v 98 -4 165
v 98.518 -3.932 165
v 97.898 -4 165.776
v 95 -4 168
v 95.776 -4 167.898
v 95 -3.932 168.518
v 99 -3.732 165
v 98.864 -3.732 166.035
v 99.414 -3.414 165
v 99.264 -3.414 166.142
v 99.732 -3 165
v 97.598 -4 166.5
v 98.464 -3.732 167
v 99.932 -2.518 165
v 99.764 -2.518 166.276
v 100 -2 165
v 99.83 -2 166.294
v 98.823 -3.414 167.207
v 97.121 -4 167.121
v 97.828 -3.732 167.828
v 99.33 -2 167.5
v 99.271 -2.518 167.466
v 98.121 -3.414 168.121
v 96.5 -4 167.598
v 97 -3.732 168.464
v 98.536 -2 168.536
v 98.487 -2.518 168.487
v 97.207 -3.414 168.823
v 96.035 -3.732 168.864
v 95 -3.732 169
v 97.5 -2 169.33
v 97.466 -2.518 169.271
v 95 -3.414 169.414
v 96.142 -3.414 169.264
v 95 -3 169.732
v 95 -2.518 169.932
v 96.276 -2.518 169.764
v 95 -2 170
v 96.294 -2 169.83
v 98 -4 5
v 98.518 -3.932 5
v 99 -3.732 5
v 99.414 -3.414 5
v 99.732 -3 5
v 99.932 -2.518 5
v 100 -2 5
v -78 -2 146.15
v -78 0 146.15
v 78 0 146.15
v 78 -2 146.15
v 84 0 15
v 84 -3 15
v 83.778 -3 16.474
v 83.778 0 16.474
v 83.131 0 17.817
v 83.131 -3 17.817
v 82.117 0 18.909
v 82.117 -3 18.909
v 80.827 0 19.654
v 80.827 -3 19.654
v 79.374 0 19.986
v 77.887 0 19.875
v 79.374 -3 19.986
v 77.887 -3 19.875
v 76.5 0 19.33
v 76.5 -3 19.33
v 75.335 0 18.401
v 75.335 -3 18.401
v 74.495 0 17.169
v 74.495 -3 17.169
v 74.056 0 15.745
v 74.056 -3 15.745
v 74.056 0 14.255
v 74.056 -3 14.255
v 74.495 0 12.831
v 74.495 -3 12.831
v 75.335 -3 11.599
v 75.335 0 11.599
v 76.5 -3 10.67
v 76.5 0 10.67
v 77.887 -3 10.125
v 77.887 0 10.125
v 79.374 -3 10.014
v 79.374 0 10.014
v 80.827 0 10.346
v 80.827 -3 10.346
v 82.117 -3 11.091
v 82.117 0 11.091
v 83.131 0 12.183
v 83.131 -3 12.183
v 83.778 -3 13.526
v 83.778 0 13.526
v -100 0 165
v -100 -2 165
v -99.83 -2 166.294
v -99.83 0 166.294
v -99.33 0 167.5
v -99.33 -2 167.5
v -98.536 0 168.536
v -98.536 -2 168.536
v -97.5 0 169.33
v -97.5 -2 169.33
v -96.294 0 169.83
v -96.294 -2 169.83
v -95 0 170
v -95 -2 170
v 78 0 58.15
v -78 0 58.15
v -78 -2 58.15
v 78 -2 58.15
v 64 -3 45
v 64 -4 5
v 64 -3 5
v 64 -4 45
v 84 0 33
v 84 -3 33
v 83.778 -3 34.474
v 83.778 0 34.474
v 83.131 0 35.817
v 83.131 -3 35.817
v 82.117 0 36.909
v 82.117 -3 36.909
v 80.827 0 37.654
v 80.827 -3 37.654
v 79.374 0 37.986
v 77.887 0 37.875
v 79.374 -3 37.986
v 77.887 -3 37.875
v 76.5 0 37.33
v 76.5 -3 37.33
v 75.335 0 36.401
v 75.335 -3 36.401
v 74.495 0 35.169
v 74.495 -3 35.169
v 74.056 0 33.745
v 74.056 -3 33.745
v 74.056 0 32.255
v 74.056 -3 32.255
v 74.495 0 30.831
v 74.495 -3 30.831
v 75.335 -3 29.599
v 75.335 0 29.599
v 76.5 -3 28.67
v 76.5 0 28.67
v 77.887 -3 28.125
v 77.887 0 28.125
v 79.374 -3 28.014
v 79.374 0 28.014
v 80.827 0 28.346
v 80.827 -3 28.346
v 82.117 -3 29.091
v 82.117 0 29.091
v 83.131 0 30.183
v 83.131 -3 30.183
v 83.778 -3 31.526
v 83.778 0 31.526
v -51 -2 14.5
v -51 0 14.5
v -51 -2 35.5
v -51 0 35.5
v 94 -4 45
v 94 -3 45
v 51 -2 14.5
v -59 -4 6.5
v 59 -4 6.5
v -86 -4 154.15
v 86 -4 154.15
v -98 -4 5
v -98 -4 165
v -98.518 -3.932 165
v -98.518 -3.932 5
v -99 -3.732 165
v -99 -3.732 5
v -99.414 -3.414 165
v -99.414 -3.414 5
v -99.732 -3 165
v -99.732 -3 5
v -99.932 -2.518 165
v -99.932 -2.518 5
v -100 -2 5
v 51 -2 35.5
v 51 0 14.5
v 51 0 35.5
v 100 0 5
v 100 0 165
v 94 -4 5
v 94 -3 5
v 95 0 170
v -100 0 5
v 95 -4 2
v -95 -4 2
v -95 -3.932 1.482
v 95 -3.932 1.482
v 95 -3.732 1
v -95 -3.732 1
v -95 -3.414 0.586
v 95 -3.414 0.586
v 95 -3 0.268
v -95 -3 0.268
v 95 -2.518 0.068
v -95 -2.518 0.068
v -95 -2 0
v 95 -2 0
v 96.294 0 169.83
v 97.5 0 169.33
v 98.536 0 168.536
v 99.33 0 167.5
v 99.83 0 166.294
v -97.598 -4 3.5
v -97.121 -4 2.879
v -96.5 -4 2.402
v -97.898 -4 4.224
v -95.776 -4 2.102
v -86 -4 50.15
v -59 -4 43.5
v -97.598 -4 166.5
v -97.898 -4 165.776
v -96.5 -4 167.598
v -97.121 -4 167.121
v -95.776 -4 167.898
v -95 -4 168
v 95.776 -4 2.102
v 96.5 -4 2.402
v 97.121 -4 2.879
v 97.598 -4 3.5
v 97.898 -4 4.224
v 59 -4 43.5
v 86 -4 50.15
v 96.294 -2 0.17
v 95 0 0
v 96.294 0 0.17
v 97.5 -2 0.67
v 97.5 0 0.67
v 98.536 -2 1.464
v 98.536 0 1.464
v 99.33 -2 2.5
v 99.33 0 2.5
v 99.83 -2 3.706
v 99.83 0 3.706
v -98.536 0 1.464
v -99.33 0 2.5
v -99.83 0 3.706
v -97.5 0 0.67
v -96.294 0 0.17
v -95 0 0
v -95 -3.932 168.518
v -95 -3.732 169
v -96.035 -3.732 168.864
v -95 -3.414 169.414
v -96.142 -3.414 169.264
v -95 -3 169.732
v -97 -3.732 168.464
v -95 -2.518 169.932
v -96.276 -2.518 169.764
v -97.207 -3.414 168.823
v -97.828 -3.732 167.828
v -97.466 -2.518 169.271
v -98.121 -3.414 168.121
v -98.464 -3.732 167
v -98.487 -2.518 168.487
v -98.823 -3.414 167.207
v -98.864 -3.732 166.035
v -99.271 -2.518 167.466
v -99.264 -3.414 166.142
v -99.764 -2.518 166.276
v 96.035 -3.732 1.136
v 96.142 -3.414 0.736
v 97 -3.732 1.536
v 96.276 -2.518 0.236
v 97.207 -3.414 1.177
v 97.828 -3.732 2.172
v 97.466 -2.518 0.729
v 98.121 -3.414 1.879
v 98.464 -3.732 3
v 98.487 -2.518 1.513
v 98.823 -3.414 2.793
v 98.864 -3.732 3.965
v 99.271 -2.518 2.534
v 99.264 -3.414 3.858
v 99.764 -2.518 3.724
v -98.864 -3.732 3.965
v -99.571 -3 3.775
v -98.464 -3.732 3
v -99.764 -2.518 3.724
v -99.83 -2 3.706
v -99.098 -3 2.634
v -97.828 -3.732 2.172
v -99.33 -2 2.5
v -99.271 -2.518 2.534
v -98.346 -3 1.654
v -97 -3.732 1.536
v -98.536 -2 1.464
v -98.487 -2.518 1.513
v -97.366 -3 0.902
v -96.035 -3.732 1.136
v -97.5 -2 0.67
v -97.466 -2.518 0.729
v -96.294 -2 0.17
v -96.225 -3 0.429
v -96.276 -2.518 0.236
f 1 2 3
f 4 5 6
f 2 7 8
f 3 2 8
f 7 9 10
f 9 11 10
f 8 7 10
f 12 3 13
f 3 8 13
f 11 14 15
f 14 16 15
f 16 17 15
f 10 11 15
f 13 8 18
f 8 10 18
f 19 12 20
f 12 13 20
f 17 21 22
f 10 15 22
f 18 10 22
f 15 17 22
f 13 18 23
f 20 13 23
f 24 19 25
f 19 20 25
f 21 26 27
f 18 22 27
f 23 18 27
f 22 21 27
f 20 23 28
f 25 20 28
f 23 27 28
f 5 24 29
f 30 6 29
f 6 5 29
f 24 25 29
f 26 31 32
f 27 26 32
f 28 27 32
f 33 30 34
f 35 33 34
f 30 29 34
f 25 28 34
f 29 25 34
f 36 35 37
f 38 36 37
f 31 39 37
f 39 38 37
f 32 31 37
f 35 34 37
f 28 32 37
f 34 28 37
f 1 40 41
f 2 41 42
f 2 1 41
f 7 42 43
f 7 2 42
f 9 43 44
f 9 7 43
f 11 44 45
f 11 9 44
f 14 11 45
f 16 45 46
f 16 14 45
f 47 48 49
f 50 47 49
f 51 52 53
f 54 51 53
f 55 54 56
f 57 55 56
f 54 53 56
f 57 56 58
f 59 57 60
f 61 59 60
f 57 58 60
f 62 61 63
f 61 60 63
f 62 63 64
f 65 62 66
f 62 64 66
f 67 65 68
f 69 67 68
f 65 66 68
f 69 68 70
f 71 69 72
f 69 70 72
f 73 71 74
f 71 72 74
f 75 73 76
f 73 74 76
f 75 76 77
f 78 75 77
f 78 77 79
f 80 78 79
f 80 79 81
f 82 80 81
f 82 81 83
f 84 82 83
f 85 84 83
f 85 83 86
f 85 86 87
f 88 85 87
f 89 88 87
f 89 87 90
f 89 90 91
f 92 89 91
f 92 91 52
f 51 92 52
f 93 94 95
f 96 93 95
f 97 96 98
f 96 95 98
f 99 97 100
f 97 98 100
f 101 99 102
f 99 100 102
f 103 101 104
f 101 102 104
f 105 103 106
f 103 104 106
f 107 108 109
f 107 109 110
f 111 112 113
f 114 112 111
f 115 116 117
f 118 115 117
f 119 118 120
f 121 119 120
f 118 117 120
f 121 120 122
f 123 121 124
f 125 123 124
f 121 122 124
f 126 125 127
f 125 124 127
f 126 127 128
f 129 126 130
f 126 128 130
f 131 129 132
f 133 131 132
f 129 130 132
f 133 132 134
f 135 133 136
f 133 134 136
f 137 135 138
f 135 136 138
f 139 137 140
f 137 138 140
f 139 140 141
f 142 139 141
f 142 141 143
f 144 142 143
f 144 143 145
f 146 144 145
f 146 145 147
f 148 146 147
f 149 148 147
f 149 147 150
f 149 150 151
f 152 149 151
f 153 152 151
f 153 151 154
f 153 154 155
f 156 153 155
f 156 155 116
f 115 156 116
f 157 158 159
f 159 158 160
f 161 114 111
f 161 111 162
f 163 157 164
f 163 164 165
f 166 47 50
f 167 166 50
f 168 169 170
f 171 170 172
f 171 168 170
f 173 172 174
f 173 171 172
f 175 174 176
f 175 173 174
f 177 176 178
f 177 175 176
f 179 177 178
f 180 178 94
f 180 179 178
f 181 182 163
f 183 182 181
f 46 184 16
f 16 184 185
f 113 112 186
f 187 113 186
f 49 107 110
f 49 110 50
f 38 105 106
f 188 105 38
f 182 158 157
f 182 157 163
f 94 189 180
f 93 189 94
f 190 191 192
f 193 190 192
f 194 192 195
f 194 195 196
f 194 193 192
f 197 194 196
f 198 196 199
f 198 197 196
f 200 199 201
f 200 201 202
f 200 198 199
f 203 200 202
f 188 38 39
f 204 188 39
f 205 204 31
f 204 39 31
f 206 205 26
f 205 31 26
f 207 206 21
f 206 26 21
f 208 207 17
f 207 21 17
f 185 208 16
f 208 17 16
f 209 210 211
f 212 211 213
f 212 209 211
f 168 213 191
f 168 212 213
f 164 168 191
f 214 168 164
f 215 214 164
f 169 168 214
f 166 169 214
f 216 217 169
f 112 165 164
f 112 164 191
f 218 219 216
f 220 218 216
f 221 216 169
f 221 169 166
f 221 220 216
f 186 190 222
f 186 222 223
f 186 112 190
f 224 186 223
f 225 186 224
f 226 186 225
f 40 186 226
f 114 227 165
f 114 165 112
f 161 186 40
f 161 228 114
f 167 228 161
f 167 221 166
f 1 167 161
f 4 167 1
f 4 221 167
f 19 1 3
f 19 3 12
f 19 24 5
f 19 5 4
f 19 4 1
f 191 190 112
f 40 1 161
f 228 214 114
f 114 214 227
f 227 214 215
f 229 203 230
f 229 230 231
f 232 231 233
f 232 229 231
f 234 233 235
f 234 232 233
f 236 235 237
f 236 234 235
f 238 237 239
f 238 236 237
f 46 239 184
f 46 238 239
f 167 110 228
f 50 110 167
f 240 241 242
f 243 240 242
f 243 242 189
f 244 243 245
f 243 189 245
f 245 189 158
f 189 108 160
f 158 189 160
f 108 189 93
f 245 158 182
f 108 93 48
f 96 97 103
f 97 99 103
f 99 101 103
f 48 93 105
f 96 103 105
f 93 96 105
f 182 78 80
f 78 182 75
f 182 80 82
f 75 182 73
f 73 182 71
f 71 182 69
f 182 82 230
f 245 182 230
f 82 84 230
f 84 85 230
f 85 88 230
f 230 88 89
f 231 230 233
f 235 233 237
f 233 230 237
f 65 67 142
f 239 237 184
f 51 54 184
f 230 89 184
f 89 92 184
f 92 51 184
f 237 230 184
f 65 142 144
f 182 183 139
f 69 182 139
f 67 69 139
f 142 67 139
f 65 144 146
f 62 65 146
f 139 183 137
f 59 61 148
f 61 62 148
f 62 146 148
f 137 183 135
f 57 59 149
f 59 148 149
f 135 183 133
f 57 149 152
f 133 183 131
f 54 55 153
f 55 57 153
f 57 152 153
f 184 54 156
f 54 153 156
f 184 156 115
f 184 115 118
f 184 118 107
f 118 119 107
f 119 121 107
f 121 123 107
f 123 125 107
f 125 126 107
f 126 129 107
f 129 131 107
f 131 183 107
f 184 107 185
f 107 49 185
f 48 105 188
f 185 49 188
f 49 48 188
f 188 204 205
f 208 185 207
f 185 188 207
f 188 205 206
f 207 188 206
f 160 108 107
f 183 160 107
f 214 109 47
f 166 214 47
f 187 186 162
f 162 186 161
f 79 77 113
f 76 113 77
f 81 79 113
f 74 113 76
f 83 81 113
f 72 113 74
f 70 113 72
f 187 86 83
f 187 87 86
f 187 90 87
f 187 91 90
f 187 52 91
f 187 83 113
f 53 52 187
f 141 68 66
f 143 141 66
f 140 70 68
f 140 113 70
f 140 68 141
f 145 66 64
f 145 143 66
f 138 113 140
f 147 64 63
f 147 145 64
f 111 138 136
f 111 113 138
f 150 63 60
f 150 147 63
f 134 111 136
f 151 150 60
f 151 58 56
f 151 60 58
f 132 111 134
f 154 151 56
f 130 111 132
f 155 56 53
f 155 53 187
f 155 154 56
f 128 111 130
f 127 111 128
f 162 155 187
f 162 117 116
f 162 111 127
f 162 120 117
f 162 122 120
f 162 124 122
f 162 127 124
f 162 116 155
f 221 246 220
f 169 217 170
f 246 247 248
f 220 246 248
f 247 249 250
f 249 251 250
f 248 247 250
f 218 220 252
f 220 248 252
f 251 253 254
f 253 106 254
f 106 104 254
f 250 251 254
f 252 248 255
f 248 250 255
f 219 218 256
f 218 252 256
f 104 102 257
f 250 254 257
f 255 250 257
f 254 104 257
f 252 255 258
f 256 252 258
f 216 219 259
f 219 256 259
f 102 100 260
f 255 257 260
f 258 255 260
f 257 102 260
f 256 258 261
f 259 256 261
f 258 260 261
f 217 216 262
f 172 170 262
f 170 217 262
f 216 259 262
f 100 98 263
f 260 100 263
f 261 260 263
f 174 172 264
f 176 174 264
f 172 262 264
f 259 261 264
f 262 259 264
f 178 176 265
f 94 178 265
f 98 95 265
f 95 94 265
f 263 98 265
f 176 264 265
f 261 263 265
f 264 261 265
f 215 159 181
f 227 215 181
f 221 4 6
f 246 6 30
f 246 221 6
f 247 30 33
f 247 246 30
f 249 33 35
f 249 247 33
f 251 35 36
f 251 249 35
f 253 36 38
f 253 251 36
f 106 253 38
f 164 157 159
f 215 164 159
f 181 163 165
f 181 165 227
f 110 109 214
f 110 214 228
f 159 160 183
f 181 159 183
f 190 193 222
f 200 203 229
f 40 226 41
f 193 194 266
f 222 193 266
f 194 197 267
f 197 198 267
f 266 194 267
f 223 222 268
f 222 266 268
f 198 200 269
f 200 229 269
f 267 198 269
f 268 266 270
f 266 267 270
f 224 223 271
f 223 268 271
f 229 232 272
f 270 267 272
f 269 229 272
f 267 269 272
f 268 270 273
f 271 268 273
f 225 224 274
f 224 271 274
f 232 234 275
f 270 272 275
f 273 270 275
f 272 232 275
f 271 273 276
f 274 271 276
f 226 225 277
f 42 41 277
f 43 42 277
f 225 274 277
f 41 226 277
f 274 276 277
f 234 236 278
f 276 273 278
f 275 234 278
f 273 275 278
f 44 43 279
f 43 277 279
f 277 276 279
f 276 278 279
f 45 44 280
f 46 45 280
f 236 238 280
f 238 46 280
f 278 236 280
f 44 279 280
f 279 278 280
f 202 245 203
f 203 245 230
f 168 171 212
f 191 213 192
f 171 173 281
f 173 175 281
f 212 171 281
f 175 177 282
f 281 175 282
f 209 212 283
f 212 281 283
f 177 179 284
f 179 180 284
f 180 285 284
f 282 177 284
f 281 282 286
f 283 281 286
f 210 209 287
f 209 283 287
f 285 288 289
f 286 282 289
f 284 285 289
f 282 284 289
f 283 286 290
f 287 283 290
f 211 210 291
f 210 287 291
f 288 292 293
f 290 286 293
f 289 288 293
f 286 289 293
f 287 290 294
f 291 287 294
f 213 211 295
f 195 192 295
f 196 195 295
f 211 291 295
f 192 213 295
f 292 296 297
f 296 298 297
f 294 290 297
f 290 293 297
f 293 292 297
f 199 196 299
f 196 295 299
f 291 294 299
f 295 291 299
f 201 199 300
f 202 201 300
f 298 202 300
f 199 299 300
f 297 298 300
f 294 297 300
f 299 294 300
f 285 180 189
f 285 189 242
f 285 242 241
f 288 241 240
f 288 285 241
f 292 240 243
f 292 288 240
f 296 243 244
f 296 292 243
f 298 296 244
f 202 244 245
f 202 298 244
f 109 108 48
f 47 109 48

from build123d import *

# Parameters (mm, degrees)
F0_W     = 200
F0_H     = 170
F0_W_2   = 102
F0_H_2   = 21
F0_W_3   = 156
F0_H_3   = 88
F1_DEPTH = 4
F2_R     = 5
F3_R     = 5
F4_SIZE2 = 2
F4_SIZE  = 8
F5_R     = 2
F6_W     = 30
F6_H     = 40
F7_DEPTH = 1
F8_R     = 5
F9_DEPTH = 25


with BuildPart() as f1:
    # F0 (on Front) → F1 (new body)
    with BuildSketch(Plane.XZ):
        with Locations((0, 85)):
            Rectangle(F0_W, F0_H)
        with Locations((0, 25)):
            Rectangle(F0_W_2, F0_H_2, mode=Mode.SUBTRACT)
        with Locations((0, 102.15)):
            Rectangle(F0_W_3, F0_H_3, mode=Mode.SUBTRACT)
    extrude(amount=F1_DEPTH)

    # F2
    f2_edges = [f1.edges().sort_by_distance(p)[0] for p in [
        (-100, -2, 0),
    ]]
    fillet(f2_edges, radius=F2_R)

    # F3
    f3_edges = [f1.edges().sort_by_distance(p)[0] for p in [
        (100, -2, 0),
        (100, -2, 170),
        (-100, -2, 170),
    ]]
    fillet(f3_edges, radius=F3_R)

    # F4
    f4_edges = [f1.edges().sort_by_distance(p)[0] for p in [
        (-78, -4, 102.15),
        (78, -4, 102.15),
        (0, -4, 146.15),
        (0, -4, 58.15),
        (0, -4, 35.5),
        (0, -4, 14.5),
        (-51, -4, 25),
        (51, -4, 25),
    ]]
    f4_side = f1.faces().sort_by_distance((-97.375119, -4, 85))[0]
    chamfer(f4_edges, length=F4_SIZE, length2=F4_SIZE2, reference=f4_side)

    # F5
    f5_edges = [f1.edges().sort_by_distance(p)[0] for p in [
        (0, -4, 0),
    ]]
    fillet(f5_edges, radius=F5_R)

    # F6 (on face) → F7 (cut)
    with BuildSketch(Plane.XZ.offset(4)):
        with Locations((79, 25)):
            Rectangle(F6_W, F6_H)
    extrude(amount=-F7_DEPTH, mode=Mode.SUBTRACT)

    # F8 (on face) → F9 (cut)
    with BuildSketch(Plane.XZ.offset(3)):
        with Locations((79, 15)):
            Circle(F8_R)
        with Locations((79, 33)):
            Circle(F8_R)
    extrude(amount=-F9_DEPTH, mode=Mode.SUBTRACT)


solid = f1.part
